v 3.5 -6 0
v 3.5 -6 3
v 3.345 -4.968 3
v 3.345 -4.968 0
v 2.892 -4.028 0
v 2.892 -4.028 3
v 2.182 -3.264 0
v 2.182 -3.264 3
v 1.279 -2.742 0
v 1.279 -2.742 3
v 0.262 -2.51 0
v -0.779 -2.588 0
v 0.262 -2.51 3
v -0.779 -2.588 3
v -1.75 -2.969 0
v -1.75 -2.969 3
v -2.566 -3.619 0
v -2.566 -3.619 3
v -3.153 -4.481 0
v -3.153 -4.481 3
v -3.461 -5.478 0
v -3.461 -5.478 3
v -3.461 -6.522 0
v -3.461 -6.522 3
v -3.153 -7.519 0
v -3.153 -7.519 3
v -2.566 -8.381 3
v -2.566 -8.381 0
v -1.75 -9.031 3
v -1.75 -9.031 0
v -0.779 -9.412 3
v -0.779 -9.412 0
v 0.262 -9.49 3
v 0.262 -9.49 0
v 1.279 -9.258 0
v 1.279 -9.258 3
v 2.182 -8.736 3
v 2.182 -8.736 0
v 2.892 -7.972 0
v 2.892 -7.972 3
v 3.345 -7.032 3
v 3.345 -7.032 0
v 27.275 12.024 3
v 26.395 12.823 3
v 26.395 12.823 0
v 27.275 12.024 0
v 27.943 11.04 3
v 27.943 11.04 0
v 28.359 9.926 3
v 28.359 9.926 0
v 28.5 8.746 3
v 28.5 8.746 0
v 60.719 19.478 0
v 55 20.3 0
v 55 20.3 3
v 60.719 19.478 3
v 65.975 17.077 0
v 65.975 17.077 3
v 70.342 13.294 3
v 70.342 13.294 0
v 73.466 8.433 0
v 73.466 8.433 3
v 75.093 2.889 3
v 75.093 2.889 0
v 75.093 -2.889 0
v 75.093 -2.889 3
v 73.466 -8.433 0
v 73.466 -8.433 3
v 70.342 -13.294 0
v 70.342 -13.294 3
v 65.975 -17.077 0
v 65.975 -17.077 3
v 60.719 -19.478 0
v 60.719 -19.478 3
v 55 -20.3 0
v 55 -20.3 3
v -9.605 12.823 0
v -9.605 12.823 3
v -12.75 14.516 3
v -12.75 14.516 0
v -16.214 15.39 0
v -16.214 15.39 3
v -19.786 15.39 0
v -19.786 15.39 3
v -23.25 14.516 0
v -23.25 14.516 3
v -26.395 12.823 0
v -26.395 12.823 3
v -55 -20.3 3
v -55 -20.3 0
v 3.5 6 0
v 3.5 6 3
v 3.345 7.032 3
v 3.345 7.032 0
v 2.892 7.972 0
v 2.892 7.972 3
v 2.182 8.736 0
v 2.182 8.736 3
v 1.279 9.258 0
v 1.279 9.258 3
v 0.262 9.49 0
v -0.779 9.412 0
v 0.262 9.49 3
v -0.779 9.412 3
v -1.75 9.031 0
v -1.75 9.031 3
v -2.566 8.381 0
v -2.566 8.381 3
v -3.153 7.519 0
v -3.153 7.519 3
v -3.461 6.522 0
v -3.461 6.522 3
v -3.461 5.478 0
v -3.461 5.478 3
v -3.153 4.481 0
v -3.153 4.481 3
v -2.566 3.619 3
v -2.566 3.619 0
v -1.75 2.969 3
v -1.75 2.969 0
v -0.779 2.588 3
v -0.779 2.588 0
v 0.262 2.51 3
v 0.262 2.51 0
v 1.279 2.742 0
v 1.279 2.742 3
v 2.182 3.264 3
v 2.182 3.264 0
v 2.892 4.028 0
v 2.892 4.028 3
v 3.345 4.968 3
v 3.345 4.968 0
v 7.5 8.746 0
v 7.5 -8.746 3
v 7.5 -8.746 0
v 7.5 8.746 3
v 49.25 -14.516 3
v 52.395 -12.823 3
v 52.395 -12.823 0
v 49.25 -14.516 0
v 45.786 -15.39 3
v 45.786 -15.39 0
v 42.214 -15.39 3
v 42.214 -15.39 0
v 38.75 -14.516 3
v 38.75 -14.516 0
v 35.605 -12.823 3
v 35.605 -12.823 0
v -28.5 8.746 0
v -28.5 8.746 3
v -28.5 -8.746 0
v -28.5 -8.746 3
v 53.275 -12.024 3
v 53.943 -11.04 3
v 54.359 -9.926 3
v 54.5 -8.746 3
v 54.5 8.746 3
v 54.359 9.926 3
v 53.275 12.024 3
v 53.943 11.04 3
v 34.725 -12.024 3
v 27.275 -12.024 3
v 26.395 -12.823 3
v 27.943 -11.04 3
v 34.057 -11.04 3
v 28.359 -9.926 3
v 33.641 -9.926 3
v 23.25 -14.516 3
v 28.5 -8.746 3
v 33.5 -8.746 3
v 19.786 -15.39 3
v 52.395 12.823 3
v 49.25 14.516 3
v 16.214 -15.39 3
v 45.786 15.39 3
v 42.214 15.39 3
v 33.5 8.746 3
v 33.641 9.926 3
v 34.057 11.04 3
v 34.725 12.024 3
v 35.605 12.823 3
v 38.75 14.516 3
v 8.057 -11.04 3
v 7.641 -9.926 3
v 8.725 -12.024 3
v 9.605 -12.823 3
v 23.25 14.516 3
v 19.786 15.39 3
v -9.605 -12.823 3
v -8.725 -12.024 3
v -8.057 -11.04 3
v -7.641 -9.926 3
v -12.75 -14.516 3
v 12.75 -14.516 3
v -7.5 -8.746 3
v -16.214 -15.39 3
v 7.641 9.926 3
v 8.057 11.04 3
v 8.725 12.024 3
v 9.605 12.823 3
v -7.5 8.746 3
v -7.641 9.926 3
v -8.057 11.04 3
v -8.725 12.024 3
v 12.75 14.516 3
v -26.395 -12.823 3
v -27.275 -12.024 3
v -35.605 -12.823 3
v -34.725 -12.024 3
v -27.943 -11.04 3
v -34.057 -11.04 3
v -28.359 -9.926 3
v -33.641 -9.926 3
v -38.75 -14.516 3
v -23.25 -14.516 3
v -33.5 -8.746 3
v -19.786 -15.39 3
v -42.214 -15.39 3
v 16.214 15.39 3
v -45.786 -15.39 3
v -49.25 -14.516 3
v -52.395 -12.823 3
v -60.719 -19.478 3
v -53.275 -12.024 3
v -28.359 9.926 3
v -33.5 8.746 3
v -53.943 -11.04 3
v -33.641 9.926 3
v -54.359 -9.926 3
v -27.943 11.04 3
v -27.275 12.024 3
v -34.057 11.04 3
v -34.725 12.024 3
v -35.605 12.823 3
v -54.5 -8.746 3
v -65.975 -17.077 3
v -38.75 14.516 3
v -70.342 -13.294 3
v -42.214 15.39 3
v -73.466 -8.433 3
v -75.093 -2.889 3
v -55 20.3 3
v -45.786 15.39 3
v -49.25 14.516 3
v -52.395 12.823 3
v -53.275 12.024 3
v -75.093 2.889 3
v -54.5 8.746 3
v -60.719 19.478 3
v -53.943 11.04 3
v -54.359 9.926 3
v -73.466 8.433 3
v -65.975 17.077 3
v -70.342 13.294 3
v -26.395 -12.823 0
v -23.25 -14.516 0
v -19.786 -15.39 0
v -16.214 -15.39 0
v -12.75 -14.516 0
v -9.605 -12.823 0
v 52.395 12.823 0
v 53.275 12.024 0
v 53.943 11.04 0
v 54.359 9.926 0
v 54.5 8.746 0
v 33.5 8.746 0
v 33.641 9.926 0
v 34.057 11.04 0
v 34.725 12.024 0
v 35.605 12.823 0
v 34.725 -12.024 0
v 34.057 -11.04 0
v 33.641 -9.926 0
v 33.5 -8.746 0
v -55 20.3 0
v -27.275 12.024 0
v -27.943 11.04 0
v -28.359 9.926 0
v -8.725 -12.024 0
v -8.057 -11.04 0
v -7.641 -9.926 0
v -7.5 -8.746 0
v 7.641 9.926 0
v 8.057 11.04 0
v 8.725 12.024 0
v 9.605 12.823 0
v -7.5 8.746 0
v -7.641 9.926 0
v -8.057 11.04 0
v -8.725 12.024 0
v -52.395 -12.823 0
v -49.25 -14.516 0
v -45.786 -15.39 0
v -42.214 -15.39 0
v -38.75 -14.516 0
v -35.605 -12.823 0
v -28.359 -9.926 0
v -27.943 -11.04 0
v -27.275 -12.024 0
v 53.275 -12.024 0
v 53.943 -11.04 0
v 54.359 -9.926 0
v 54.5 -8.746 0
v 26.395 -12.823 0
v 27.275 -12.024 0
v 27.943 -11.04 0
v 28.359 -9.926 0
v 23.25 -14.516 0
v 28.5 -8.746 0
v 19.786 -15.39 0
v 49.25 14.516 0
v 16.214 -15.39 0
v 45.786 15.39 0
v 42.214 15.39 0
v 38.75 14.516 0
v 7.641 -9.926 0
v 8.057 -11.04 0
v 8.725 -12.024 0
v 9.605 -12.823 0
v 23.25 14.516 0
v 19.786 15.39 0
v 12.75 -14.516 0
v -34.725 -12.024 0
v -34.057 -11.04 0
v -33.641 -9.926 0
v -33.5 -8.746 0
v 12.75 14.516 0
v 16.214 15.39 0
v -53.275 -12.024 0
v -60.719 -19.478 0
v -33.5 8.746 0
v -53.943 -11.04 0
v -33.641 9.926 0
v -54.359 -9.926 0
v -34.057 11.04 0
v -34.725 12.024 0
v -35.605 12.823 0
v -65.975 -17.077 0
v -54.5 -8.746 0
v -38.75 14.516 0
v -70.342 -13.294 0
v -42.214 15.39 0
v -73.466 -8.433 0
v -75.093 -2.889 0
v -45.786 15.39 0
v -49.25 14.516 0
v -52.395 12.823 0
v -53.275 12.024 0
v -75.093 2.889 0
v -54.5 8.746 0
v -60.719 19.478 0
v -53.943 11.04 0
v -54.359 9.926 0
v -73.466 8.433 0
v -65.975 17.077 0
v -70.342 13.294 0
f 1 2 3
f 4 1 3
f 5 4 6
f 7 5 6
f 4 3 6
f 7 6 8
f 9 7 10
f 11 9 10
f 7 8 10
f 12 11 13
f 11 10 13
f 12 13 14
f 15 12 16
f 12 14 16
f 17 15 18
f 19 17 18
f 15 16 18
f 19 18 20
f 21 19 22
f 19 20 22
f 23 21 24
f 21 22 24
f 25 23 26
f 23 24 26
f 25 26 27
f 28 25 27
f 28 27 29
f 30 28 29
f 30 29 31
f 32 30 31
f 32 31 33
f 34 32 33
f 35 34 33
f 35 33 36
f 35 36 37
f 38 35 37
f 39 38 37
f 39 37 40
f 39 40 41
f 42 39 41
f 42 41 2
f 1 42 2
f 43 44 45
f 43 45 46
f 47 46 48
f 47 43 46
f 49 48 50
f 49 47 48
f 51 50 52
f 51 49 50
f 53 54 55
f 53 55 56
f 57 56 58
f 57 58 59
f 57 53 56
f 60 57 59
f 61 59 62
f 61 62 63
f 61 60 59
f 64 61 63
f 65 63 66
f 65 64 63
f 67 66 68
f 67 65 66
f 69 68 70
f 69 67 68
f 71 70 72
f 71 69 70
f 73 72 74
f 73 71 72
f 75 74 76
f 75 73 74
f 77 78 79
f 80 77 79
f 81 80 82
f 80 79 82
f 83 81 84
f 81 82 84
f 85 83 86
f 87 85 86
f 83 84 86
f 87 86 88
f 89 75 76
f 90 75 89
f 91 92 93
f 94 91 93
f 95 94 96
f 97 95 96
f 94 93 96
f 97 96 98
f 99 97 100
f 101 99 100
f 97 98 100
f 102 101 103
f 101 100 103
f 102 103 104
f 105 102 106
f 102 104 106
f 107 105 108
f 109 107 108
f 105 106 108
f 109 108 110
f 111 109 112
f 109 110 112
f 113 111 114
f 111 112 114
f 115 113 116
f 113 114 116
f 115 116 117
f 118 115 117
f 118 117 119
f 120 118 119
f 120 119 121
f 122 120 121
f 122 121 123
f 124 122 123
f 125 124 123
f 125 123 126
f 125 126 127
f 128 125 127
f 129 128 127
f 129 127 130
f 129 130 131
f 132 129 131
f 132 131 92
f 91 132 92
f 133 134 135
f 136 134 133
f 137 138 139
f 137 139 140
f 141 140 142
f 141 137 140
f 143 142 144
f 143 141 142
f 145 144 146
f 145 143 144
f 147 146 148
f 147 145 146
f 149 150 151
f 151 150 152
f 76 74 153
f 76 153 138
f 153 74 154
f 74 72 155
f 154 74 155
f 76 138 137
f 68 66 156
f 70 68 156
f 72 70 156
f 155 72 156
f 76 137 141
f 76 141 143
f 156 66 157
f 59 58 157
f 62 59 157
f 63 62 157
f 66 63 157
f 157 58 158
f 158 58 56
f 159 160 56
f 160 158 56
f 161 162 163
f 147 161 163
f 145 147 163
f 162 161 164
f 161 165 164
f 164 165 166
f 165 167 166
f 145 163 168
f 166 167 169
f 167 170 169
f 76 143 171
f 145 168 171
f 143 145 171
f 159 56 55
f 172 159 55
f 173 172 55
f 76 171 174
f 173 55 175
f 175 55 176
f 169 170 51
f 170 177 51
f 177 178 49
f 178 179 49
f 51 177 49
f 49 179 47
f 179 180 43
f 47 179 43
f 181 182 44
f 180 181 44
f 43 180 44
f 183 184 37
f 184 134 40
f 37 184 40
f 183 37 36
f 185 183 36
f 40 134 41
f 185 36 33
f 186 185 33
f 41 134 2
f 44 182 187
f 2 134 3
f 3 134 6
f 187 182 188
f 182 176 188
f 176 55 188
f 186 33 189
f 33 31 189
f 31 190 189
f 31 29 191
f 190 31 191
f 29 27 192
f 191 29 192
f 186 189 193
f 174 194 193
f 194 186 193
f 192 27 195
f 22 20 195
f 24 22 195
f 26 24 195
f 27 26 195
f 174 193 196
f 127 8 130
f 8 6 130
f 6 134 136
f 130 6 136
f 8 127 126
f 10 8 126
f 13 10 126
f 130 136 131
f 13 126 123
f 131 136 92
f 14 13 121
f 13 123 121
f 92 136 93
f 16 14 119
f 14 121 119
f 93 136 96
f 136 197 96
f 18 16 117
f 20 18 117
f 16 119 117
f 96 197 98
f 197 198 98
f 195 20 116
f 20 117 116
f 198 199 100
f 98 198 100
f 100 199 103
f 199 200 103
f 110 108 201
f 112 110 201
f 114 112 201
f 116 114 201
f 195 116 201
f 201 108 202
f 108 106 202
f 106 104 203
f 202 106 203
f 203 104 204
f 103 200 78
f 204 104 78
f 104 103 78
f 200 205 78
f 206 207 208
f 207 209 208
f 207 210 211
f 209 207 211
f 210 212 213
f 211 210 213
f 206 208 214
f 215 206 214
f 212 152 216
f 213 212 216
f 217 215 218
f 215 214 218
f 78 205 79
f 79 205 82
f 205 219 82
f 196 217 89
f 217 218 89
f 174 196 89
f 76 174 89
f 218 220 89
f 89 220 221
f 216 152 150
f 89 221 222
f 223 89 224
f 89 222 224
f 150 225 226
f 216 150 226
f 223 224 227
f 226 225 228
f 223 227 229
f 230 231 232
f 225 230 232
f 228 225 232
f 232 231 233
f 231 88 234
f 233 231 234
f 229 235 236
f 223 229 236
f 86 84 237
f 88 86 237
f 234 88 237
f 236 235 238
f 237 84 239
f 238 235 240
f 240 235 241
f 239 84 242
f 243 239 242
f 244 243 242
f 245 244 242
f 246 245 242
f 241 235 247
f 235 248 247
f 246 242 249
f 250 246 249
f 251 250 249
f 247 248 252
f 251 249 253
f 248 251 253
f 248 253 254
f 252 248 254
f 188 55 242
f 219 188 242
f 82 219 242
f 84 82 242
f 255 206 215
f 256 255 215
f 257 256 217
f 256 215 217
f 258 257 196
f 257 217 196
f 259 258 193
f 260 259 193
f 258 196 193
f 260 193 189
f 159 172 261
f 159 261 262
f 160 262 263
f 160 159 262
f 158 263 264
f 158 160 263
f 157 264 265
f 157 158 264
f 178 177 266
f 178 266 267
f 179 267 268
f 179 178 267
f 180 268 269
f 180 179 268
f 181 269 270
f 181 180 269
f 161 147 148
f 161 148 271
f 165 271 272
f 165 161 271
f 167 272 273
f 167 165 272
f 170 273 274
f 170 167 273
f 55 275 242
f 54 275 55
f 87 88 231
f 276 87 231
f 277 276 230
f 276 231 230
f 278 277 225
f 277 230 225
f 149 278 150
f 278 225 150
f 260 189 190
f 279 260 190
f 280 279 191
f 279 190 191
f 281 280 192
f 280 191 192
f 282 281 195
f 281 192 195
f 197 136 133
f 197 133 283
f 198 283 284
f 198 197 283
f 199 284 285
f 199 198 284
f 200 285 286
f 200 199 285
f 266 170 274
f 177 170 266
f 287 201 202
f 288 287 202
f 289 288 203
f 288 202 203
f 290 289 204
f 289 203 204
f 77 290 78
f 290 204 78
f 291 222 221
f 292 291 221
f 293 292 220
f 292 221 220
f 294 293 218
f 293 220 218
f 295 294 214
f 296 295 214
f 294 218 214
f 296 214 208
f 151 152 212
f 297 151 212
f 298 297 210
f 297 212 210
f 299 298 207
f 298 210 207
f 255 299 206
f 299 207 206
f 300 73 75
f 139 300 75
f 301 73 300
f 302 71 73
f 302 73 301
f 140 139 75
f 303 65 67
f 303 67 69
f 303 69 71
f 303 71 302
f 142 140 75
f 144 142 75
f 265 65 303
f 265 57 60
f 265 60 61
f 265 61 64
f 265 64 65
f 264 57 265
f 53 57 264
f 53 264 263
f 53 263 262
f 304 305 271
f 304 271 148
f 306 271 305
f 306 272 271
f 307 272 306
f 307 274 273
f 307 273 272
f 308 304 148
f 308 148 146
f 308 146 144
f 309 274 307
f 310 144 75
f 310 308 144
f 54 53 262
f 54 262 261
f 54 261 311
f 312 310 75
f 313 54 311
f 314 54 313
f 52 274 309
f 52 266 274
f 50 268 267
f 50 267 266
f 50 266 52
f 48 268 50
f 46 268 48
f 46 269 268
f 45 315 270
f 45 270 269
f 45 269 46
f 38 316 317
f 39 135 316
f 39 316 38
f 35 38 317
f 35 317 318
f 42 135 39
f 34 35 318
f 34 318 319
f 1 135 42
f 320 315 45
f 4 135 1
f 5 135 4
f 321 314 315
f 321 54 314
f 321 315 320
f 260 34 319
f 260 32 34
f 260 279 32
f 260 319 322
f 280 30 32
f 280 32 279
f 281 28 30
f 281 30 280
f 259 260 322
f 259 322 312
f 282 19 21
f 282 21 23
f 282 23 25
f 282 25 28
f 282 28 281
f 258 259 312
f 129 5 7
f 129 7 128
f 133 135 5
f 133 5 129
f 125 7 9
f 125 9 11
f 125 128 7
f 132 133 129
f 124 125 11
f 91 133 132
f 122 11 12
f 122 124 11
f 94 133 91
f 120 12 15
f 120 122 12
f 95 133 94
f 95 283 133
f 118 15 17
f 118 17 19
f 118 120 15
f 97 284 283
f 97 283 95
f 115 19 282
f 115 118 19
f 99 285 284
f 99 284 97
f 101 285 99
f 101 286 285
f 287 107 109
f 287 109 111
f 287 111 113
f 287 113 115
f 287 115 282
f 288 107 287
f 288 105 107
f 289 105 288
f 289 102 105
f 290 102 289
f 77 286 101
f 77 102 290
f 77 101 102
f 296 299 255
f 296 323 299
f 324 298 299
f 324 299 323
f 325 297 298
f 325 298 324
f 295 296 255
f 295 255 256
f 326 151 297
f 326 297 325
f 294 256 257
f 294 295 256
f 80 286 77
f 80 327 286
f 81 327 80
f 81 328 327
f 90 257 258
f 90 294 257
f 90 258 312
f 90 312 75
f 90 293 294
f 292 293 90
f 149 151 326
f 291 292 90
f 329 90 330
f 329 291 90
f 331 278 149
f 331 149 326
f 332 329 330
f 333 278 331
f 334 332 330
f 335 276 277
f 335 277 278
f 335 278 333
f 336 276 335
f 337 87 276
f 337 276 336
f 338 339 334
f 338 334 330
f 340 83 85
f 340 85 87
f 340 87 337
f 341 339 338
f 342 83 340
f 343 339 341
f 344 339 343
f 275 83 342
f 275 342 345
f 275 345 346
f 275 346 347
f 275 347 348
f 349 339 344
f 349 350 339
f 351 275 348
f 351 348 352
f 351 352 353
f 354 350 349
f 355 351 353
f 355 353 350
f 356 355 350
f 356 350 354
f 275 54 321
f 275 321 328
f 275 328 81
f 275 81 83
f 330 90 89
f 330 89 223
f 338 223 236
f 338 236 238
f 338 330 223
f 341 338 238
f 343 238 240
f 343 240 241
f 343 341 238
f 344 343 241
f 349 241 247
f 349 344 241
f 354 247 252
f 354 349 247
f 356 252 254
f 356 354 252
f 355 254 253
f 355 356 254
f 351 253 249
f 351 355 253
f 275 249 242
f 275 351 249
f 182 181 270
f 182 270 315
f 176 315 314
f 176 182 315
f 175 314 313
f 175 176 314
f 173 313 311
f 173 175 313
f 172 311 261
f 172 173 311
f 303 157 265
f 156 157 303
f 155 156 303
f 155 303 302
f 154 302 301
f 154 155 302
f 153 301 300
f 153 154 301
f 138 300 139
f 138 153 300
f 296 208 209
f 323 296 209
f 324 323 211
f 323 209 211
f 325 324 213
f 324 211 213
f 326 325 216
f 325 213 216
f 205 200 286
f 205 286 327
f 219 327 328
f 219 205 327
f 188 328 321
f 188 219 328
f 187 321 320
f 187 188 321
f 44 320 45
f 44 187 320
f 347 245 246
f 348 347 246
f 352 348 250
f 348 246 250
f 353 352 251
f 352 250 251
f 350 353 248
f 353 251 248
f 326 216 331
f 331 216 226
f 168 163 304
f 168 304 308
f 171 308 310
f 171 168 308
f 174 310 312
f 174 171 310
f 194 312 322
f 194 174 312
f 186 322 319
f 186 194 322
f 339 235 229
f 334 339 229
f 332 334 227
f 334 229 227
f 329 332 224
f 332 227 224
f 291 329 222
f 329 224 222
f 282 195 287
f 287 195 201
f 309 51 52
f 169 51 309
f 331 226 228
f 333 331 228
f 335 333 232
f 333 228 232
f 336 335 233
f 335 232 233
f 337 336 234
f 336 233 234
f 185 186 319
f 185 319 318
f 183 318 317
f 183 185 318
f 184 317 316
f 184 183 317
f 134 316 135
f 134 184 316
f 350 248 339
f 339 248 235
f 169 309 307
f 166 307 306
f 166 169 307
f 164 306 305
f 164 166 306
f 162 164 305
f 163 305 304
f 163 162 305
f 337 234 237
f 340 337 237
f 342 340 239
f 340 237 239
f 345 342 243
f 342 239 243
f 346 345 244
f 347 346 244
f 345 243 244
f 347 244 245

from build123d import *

# Parameters (mm, degrees)
BOSS_EXTRU_1_DEPTH      = 3
ESQUISSE2_R             = 3.5
ENL_V_MAT_EXTRU_1_DEPTH = 79.04601207


with BuildPart() as part:
    # Esquisse1 → Boss.-Extru.1 (new body)
    with BuildSketch(Plane.XY):
        with BuildLine():
            Line((-55, 20.3), (55, 20.3))
            ThreePointArc((55, 20.3), (75.3, 0), (55, -20.3))
            Line((55, -20.3), (-55, -20.3))
            ThreePointArc((-55, -20.3), (-75.3, 0), (-55, 20.3))
        make_face()
    extrude(amount=BOSS_EXTRU_1_DEPTH)

    # Esquisse2 → Enlèv. mat.-Extru.1 (cut, through all)
    with BuildSketch(Plane.XY.offset(3)):
        with Locations((0, 6)):
            Circle(ESQUISSE2_R)
        with Locations((0, -6)):
            Circle(ESQUISSE2_R)
        with BuildLine():
            Line((-7.5, -8.745966692), (-7.5, 8.745966692))
            ThreePointArc((-7.5, 8.745966692), (-8.057383417, 11.040124031), (-9.605263158, 12.822791267))
            ThreePointArc((-9.605263158, 12.822791267), (-18, 15.5), (-26.394736842, 12.822791267))
            ThreePointArc((-26.394736842, 12.822791267), (-27.942616583, 11.040124031), (-28.5, 8.745966692))
            Line((-28.5, 8.745966692), (-28.5, -8.745966692))
            ThreePointArc((-28.5, -8.745966692), (-27.942616583, -11.040124031), (-26.394736842, -12.822791267))
            ThreePointArc((-26.394736842, -12.822791267), (-18, -15.5), (-9.605263158, -12.822791267))
            ThreePointArc((-9.605263158, -12.822791267), (-8.057383417, -11.040124031), (-7.5, -8.745966692))
        make_face()
        with BuildLine():
            Line((-33.5, -8.745966692), (-33.5, 8.745966692))
            ThreePointArc((-33.5, 8.745966692), (-34.057383417, 11.040124031), (-35.605263158, 12.822791267))
            ThreePointArc((-35.605263158, 12.822791267), (-44, 15.5), (-52.394736842, 12.822791267))
            ThreePointArc((-52.394736842, 12.822791267), (-53.942616583, 11.040124031), (-54.5, 8.745966692))
            Line((-54.5, 8.745966692), (-54.5, -8.745966692))
            ThreePointArc((-54.5, -8.745966692), (-53.942616583, -11.040124031), (-52.394736842, -12.822791267))
            ThreePointArc((-52.394736842, -12.822791267), (-44, -15.5), (-35.605263158, -12.822791267))
            ThreePointArc((-35.605263158, -12.822791267), (-34.057383417, -11.040124031), (-33.5, -8.745966692))
        make_face()
        with BuildLine():
            Line((28.5, 8.745966692), (28.5, -8.745966692))
            ThreePointArc((28.5, -8.745966692), (27.942616583, -11.040124031), (26.394736842, -12.822791267))
            ThreePointArc((26.394736842, -12.822791267), (18, -15.5), (9.605263158, -12.822791267))
            ThreePointArc((9.605263158, -12.822791267), (8.057383417, -11.040124031), (7.5, -8.745966692))
            Line((7.5, -8.745966692), (7.5, 8.745966692))
            ThreePointArc((7.5, 8.745966692), (8.057383417, 11.040124031), (9.605263158, 12.822791267))
            ThreePointArc((9.605263158, 12.822791267), (18, 15.5), (26.394736842, 12.822791267))
            ThreePointArc((26.394736842, 12.822791267), (27.942616583, 11.040124031), (28.5, 8.745966692))
        make_face()
        with BuildLine():
            Line((54.5, 8.745966692), (54.5, -8.745966692))
            ThreePointArc((54.5, -8.745966692), (53.942616583, -11.040124031), (52.394736842, -12.822791267))
            ThreePointArc((52.394736842, -12.822791267), (44, -15.5), (35.605263158, -12.822791267))
            ThreePointArc((35.605263158, -12.822791267), (34.057383417, -11.040124031), (33.5, -8.745966692))
            Line((33.5, -8.745966692), (33.5, 8.745966692))
            ThreePointArc((33.5, 8.745966692), (34.057383417, 11.040124031), (35.605263158, 12.822791267))
            ThreePointArc((35.605263158, 12.822791267), (44, 15.5), (52.394736842, 12.822791267))
            ThreePointArc((52.394736842, 12.822791267), (53.942616583, 11.040124031), (54.5, 8.745966692))
        make_face()
    extrude(amount=-ENL_V_MAT_EXTRU_1_DEPTH, mode=Mode.SUBTRACT)


solid = part.part
